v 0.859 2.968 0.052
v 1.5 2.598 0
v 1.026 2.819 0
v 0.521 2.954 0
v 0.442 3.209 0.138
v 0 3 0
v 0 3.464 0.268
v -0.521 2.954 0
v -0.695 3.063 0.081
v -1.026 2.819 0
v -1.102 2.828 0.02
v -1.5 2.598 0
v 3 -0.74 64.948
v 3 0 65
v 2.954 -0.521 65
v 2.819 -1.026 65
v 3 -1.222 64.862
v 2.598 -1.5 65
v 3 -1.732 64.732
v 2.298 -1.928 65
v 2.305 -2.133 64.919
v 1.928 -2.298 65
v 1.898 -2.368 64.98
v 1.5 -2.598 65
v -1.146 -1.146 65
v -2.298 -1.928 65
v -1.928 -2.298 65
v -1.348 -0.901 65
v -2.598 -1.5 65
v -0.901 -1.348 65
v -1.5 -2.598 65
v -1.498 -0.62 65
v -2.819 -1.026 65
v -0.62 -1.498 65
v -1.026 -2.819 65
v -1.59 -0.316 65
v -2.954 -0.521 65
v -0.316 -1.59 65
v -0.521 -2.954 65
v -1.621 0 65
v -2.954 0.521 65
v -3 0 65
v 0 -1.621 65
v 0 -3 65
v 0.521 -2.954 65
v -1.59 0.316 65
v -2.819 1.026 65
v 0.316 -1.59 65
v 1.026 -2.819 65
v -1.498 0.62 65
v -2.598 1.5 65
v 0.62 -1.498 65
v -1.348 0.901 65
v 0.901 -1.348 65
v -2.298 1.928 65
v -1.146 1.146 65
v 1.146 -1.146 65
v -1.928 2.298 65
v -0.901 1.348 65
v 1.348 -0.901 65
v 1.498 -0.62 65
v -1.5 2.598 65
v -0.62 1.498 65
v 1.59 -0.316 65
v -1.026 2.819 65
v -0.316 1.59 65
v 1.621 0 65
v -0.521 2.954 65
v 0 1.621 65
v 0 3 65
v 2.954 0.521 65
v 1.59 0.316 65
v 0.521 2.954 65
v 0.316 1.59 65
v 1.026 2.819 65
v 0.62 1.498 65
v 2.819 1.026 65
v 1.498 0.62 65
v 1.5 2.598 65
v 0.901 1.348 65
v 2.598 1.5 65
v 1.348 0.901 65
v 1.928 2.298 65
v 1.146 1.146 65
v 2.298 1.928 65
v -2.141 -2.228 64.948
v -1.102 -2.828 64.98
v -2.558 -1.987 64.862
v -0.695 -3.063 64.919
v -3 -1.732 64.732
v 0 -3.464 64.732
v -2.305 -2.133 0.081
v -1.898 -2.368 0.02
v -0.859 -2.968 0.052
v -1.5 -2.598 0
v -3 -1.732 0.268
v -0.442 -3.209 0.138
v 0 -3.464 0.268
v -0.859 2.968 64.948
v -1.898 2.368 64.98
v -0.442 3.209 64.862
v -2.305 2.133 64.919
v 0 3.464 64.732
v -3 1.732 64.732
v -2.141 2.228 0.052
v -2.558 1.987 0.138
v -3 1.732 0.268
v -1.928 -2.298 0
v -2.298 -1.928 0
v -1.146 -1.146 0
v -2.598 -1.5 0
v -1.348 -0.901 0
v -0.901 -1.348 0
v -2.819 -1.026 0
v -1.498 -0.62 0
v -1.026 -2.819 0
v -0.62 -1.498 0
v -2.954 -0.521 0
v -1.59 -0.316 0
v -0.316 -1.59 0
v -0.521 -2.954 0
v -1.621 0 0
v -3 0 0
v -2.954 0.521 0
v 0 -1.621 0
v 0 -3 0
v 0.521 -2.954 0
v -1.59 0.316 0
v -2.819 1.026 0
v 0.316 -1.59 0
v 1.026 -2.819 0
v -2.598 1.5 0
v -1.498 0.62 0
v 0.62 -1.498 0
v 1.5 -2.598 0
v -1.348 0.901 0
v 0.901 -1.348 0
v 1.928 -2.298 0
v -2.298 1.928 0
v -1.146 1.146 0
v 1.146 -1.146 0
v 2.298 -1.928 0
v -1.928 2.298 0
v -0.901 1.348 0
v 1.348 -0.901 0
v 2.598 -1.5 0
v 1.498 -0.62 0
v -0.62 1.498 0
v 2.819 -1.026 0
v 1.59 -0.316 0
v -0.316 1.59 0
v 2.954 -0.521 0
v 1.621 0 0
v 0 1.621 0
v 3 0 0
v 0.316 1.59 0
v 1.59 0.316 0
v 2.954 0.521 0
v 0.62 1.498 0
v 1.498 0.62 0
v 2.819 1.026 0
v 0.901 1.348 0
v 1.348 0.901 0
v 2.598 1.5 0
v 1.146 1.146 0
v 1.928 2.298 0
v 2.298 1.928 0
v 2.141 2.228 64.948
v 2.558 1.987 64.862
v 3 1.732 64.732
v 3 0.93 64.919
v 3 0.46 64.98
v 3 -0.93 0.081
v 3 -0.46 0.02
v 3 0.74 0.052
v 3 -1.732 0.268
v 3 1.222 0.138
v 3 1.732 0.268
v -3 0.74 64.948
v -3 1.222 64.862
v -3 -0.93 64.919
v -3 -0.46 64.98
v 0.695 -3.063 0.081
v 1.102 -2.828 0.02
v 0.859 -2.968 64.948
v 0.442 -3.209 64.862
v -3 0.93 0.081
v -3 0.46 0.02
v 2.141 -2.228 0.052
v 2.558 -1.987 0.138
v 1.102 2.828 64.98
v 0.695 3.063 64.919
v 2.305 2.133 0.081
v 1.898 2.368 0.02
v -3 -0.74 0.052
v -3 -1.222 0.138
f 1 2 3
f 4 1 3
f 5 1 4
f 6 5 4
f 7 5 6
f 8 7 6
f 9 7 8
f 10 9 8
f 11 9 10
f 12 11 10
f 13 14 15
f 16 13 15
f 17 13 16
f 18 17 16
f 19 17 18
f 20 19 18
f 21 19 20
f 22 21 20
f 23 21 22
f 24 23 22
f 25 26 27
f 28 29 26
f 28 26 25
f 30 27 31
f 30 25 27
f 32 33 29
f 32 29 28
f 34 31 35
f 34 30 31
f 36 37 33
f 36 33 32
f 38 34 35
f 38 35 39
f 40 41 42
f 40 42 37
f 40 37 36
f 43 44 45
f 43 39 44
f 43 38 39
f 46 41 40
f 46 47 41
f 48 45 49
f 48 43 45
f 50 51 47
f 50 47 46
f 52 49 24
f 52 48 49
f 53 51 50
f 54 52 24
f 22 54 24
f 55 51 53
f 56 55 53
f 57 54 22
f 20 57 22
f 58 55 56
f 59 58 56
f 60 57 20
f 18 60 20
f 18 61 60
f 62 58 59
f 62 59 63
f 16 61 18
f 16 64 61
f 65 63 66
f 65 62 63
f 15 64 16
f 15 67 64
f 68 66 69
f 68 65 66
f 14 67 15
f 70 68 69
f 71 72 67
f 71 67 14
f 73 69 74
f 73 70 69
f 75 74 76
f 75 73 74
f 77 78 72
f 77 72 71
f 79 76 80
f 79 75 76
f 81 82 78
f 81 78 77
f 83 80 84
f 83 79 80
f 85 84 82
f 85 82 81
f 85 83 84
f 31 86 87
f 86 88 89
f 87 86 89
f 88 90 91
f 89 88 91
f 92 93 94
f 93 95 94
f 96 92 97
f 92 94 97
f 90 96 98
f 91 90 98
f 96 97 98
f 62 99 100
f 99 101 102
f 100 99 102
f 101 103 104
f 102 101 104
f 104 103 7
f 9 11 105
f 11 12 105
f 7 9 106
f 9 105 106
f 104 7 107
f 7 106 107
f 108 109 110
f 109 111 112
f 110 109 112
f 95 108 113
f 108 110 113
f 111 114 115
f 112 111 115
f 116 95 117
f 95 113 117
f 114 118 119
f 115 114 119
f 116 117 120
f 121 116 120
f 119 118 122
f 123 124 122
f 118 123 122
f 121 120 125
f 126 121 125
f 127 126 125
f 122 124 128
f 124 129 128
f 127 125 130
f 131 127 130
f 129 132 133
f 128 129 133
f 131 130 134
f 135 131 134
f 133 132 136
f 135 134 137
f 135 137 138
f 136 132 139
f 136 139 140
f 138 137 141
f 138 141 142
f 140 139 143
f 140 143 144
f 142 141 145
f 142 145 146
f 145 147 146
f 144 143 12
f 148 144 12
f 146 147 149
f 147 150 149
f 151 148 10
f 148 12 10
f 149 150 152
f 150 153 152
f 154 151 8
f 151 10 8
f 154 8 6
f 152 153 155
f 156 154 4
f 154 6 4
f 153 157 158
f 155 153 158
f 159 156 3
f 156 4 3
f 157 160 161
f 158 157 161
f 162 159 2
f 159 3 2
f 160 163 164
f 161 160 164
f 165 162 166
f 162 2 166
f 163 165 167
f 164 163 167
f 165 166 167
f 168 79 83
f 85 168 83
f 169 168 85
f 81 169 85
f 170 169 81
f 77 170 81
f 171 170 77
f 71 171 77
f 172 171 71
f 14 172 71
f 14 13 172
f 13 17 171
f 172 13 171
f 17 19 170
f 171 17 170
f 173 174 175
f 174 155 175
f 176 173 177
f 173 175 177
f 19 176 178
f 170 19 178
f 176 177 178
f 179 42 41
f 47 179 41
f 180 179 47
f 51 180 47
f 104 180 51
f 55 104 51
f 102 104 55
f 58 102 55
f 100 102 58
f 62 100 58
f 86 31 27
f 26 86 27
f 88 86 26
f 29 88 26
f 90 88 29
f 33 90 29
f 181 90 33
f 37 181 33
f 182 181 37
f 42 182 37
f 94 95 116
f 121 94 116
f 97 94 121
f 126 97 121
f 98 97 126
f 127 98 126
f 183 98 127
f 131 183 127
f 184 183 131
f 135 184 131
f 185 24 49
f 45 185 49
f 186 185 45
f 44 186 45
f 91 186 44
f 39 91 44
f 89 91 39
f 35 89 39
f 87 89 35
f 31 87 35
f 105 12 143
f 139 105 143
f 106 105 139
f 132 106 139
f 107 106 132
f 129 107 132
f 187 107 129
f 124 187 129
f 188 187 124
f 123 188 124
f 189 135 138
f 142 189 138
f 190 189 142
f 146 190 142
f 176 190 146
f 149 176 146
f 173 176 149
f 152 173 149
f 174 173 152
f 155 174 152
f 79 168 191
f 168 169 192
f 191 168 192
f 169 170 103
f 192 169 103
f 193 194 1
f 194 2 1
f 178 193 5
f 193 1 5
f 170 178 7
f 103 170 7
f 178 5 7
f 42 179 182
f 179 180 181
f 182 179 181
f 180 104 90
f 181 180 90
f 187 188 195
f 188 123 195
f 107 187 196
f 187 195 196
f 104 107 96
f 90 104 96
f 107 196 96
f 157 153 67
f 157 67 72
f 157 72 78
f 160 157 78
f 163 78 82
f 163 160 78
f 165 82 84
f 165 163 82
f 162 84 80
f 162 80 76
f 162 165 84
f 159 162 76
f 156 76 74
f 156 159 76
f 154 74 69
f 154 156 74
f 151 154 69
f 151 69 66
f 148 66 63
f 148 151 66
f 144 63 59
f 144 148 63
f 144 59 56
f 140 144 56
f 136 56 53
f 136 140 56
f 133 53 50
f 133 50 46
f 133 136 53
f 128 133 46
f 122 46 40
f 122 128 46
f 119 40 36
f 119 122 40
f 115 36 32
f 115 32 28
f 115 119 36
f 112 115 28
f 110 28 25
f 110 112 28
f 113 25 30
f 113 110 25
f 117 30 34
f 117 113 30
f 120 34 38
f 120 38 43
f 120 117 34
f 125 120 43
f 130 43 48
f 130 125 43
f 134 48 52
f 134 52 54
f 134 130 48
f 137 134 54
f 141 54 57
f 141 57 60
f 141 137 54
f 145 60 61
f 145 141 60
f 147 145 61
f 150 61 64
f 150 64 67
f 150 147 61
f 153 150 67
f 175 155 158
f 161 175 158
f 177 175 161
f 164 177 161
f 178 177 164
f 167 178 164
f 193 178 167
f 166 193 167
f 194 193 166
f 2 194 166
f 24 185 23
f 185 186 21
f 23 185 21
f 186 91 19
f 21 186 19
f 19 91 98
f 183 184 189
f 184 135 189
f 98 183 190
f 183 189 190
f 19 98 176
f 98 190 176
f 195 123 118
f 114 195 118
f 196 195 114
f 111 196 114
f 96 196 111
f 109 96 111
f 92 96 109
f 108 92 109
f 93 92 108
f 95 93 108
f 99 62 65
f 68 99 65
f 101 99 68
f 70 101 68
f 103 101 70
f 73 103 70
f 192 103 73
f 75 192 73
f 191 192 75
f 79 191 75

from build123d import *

# Parameters (mm, degrees)
SKETCH_1_R          = 1.621125
EXTRUDE_700_DEPTH   = 65
SKETCH_2_OUTSIDE_W  = 249.76
SKETCH_2_OUTSIDE_H  = 250.688
SKETCH_2_OUTSIDE_R  = 3
CUT_EXTRUDE_1_DEPTH = 66
CUT_EXTRUDE_1_TAPER = 60
SKETCH_3_OUTSIDE_W  = 249.76
SKETCH_3_OUTSIDE_H  = 250.688
SKETCH_3_OUTSIDE_R  = 3
CUT_EXTRUDE_2_DEPTH = 66
CUT_EXTRUDE_2_TAPER = 60


with BuildPart() as part:
    # 草图1 → Extrude 700 (new body)
    with BuildSketch(Plane.XY):
        Polygon((0, 3.464101615), (-3, 1.732050808), (-3, -1.732050808), (0, -3.464101615), (3, -1.732050808), (3, 1.732050808), align=None)
        Circle(SKETCH_1_R, mode=Mode.SUBTRACT)
    extrude(amount=EXTRUDE_700_DEPTH)

    # 草图2 outside → 切除-拉伸1 (cut, through all)
    with BuildSketch(Plane(origin=(0, 0, 0), x_dir=(-1, 0, 0), z_dir=(0, 0, -1))):
        Rectangle(SKETCH_2_OUTSIDE_W, SKETCH_2_OUTSIDE_H)
        Circle(SKETCH_2_OUTSIDE_R, mode=Mode.SUBTRACT)
    extrude(amount=-CUT_EXTRUDE_1_DEPTH, taper=CUT_EXTRUDE_1_TAPER, mode=Mode.SUBTRACT)

    # 草图3 outside → 切除-拉伸2 (cut, through all)
    with BuildSketch(Plane.XY.offset(65)):
        Rectangle(SKETCH_3_OUTSIDE_W, SKETCH_3_OUTSIDE_H)
        Circle(SKETCH_3_OUTSIDE_R, mode=Mode.SUBTRACT)
    extrude(amount=-CUT_EXTRUDE_2_DEPTH, taper=CUT_EXTRUDE_2_TAPER, mode=Mode.SUBTRACT)


solid = part.part
